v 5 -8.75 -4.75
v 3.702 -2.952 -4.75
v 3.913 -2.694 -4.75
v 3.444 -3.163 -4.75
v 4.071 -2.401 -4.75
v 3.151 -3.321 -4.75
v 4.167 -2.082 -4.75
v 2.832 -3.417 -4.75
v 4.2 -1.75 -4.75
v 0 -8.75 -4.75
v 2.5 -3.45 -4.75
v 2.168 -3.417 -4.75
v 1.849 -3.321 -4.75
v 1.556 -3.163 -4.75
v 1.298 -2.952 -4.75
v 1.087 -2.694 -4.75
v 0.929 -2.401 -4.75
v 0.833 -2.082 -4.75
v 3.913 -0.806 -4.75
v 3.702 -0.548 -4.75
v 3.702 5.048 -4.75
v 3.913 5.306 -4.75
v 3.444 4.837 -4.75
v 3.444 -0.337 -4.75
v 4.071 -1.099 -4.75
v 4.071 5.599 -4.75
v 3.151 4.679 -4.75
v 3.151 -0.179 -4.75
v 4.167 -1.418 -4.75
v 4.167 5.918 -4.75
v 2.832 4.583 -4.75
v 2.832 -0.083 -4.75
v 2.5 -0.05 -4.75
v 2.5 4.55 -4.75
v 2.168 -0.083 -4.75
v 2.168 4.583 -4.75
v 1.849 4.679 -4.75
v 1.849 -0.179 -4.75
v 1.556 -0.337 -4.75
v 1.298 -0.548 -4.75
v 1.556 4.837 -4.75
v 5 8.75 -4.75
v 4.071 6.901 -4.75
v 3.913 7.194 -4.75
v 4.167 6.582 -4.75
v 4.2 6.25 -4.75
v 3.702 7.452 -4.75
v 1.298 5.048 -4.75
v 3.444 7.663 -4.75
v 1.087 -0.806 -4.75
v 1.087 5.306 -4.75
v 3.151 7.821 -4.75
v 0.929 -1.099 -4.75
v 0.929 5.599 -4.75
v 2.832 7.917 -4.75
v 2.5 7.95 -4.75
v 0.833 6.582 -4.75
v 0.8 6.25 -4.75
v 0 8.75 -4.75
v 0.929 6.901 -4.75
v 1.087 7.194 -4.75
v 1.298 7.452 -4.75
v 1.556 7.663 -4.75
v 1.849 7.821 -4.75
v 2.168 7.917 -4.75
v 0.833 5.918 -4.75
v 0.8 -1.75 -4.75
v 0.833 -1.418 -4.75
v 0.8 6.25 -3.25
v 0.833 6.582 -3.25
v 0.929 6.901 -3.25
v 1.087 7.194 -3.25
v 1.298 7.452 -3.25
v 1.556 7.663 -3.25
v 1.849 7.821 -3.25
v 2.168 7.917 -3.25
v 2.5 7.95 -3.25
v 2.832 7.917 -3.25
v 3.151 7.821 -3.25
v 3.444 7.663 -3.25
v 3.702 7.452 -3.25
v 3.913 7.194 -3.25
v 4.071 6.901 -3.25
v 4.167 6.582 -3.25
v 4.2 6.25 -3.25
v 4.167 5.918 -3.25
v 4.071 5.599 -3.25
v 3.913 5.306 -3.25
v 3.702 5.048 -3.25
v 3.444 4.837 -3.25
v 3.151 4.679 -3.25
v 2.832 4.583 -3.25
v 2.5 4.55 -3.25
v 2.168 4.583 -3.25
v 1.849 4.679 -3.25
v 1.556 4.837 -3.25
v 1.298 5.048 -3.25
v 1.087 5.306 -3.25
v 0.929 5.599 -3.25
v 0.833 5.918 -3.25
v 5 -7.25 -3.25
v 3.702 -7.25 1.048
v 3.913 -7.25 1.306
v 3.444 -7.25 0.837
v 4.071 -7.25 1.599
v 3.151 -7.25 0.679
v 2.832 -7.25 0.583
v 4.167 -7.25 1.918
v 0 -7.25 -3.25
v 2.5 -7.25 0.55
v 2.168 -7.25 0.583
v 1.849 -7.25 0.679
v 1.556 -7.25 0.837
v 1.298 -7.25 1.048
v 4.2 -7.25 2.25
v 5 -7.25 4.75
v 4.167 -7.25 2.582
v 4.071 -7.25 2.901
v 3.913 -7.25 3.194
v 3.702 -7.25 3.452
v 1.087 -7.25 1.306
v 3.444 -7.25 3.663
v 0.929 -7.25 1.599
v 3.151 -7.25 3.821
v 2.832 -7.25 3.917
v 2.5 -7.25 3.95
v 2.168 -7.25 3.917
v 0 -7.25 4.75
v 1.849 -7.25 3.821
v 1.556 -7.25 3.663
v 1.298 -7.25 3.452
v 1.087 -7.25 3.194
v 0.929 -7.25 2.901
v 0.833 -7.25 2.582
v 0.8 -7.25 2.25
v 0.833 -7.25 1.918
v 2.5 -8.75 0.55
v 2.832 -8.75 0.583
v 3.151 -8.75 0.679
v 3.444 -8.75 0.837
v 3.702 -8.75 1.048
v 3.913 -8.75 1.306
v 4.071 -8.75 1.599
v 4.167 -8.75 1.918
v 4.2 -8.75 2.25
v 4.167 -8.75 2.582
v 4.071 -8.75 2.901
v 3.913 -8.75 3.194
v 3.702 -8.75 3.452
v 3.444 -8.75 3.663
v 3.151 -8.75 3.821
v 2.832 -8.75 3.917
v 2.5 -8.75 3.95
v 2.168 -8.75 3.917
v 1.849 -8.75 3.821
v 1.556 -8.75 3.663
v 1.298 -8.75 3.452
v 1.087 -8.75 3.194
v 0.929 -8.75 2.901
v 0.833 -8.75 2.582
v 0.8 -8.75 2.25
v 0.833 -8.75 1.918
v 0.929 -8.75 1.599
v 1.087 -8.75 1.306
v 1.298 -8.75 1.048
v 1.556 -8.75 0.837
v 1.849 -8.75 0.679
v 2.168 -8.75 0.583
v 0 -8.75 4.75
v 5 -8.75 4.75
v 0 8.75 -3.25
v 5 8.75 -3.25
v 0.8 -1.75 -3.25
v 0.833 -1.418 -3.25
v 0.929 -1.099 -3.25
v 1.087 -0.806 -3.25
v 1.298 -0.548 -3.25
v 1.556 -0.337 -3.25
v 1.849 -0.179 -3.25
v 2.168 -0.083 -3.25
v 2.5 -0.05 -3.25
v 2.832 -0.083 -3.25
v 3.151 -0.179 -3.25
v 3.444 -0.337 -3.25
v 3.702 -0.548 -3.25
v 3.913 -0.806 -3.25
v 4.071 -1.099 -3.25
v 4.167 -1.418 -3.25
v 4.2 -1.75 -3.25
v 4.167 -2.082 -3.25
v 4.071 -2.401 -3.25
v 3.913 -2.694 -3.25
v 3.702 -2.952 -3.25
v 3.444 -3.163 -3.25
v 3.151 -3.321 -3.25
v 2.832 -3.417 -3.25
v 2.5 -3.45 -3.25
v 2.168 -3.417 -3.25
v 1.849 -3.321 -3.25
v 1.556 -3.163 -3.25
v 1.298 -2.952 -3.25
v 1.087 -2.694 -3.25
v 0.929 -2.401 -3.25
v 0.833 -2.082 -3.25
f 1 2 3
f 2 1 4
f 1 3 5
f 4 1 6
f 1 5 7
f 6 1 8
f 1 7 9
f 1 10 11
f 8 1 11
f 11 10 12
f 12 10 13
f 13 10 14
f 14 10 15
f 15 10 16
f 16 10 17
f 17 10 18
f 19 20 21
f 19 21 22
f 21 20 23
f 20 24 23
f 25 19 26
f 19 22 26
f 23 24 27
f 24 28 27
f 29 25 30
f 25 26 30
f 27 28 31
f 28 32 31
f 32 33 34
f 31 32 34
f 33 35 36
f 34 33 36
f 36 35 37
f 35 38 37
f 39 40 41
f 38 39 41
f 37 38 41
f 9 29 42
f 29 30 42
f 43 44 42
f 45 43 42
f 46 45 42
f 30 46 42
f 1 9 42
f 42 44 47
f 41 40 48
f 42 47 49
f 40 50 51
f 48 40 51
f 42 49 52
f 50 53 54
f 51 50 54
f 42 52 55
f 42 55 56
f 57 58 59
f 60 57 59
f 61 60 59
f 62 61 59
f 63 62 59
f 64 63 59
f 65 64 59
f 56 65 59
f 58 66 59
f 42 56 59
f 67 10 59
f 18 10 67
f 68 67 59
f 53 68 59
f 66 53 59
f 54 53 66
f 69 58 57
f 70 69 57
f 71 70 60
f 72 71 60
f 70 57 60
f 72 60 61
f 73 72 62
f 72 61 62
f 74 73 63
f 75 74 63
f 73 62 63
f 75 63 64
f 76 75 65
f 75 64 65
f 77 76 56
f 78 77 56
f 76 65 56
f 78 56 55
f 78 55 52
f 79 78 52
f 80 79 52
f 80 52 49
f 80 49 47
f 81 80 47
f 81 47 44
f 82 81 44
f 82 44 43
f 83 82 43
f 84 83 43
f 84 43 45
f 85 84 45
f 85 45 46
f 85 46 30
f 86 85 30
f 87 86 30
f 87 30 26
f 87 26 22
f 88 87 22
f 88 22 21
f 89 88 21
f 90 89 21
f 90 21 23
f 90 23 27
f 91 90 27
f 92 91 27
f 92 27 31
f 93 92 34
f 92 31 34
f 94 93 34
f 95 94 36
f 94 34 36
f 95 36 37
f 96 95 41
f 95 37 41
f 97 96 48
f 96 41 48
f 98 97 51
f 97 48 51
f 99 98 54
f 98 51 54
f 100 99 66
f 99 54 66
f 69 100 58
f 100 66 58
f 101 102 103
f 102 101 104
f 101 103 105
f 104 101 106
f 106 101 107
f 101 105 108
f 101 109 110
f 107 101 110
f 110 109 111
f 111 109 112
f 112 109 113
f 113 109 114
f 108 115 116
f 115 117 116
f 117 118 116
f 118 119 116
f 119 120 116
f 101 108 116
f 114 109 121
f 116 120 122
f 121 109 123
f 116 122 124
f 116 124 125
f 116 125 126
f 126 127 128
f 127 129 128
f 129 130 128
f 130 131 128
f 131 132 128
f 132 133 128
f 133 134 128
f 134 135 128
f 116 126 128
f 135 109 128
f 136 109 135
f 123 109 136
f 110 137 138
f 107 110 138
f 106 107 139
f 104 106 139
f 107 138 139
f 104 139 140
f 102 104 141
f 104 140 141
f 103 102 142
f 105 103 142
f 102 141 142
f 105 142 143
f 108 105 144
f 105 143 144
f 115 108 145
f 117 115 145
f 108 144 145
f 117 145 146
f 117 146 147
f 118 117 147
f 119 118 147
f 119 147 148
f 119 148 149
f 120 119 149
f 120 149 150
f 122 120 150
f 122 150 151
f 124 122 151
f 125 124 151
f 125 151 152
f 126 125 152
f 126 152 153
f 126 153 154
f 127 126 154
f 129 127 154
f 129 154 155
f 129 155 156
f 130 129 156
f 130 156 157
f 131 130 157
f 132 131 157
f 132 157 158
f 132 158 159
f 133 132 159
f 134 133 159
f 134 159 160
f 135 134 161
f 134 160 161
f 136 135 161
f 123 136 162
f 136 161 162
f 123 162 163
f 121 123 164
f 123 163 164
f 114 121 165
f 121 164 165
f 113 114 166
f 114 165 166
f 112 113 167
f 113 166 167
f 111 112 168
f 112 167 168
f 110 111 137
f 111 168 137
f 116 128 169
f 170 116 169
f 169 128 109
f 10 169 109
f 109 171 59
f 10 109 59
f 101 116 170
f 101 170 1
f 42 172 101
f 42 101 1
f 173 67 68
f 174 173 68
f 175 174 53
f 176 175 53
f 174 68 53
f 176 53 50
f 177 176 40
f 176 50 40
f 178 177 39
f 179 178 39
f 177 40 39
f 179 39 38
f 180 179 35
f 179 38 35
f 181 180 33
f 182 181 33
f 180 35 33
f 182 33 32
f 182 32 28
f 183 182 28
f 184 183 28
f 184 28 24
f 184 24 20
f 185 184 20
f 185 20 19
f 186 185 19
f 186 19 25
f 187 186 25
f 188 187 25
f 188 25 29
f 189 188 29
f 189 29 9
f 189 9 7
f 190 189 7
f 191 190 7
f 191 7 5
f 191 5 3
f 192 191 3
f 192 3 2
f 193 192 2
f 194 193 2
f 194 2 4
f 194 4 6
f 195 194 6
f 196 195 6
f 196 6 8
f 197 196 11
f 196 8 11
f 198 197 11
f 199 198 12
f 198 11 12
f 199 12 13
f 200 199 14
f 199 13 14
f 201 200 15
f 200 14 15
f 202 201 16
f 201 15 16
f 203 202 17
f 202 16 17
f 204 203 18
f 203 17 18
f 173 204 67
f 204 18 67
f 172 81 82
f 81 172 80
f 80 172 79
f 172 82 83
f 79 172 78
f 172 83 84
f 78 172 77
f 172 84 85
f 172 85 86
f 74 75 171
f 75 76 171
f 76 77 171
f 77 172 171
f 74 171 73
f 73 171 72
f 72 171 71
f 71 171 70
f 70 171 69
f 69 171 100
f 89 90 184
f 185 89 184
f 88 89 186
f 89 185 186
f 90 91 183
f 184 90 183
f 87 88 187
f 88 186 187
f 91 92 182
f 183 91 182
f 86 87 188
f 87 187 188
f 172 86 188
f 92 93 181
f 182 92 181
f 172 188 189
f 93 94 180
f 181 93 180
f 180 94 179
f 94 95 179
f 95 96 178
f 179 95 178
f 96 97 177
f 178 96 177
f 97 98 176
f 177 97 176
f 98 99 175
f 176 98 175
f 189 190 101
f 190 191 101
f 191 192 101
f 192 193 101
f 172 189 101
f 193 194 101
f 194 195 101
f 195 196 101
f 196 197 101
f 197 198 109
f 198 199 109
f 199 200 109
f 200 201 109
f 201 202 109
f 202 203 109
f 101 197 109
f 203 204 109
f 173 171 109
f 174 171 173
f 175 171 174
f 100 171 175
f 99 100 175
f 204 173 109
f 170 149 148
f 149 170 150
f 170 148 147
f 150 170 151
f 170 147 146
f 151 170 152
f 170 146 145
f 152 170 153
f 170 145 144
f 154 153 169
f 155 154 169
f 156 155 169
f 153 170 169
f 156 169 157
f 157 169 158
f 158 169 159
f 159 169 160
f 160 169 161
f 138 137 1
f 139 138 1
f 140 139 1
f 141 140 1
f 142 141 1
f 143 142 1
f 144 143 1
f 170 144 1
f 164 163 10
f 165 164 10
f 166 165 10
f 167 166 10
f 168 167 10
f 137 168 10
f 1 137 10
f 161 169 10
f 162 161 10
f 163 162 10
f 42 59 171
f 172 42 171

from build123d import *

# Parameters (mm, degrees)
BOSS_EXTRUDE1_DEPTH = 5
SKETCH2_R           = 1.7
CUT_EXTRUDE1_DEPTH  = 19.809904306
SKETCH3_R           = 1.7
CUT_EXTRUDE2_DEPTH  = 14.849638984


with BuildPart() as part:
    # Sketch1 → Boss-Extrude1 (new body)
    with BuildSketch(Plane(origin=(0, 0, 0), x_dir=(0, 0, -1), z_dir=(1, 0, 0))):
        Polygon((-4.75, -7.25), (-4.75, -8.75), (4.75, -8.75), (4.75, 8.75), (3.25, 8.75), (3.25, -7.25), align=None)
    extrude(amount=BOSS_EXTRUDE1_DEPTH)

    # Sketch2 → Cut-Extrude1 (cut, through all)
    with BuildSketch(Plane.XZ.offset(8.75)):
        with Locations(Location((2.5, 2.25, 0), (0, 0, 270))):
            Circle(SKETCH2_R)
    extrude(amount=-CUT_EXTRUDE1_DEPTH, mode=Mode.SUBTRACT)

    # Sketch3 → Cut-Extrude2 (cut, through all)
    with BuildSketch(Plane(origin=(0, 0, -4.75), x_dir=(-1, 0, 0), z_dir=(0, 0, -1))):
        with Locations((-2.5, -1.75)):
            Circle(SKETCH3_R)
        with Locations((-2.5, 6.25)):
            Circle(SKETCH3_R)
    extrude(amount=-CUT_EXTRUDE2_DEPTH, mode=Mode.SUBTRACT)


solid = part.part
